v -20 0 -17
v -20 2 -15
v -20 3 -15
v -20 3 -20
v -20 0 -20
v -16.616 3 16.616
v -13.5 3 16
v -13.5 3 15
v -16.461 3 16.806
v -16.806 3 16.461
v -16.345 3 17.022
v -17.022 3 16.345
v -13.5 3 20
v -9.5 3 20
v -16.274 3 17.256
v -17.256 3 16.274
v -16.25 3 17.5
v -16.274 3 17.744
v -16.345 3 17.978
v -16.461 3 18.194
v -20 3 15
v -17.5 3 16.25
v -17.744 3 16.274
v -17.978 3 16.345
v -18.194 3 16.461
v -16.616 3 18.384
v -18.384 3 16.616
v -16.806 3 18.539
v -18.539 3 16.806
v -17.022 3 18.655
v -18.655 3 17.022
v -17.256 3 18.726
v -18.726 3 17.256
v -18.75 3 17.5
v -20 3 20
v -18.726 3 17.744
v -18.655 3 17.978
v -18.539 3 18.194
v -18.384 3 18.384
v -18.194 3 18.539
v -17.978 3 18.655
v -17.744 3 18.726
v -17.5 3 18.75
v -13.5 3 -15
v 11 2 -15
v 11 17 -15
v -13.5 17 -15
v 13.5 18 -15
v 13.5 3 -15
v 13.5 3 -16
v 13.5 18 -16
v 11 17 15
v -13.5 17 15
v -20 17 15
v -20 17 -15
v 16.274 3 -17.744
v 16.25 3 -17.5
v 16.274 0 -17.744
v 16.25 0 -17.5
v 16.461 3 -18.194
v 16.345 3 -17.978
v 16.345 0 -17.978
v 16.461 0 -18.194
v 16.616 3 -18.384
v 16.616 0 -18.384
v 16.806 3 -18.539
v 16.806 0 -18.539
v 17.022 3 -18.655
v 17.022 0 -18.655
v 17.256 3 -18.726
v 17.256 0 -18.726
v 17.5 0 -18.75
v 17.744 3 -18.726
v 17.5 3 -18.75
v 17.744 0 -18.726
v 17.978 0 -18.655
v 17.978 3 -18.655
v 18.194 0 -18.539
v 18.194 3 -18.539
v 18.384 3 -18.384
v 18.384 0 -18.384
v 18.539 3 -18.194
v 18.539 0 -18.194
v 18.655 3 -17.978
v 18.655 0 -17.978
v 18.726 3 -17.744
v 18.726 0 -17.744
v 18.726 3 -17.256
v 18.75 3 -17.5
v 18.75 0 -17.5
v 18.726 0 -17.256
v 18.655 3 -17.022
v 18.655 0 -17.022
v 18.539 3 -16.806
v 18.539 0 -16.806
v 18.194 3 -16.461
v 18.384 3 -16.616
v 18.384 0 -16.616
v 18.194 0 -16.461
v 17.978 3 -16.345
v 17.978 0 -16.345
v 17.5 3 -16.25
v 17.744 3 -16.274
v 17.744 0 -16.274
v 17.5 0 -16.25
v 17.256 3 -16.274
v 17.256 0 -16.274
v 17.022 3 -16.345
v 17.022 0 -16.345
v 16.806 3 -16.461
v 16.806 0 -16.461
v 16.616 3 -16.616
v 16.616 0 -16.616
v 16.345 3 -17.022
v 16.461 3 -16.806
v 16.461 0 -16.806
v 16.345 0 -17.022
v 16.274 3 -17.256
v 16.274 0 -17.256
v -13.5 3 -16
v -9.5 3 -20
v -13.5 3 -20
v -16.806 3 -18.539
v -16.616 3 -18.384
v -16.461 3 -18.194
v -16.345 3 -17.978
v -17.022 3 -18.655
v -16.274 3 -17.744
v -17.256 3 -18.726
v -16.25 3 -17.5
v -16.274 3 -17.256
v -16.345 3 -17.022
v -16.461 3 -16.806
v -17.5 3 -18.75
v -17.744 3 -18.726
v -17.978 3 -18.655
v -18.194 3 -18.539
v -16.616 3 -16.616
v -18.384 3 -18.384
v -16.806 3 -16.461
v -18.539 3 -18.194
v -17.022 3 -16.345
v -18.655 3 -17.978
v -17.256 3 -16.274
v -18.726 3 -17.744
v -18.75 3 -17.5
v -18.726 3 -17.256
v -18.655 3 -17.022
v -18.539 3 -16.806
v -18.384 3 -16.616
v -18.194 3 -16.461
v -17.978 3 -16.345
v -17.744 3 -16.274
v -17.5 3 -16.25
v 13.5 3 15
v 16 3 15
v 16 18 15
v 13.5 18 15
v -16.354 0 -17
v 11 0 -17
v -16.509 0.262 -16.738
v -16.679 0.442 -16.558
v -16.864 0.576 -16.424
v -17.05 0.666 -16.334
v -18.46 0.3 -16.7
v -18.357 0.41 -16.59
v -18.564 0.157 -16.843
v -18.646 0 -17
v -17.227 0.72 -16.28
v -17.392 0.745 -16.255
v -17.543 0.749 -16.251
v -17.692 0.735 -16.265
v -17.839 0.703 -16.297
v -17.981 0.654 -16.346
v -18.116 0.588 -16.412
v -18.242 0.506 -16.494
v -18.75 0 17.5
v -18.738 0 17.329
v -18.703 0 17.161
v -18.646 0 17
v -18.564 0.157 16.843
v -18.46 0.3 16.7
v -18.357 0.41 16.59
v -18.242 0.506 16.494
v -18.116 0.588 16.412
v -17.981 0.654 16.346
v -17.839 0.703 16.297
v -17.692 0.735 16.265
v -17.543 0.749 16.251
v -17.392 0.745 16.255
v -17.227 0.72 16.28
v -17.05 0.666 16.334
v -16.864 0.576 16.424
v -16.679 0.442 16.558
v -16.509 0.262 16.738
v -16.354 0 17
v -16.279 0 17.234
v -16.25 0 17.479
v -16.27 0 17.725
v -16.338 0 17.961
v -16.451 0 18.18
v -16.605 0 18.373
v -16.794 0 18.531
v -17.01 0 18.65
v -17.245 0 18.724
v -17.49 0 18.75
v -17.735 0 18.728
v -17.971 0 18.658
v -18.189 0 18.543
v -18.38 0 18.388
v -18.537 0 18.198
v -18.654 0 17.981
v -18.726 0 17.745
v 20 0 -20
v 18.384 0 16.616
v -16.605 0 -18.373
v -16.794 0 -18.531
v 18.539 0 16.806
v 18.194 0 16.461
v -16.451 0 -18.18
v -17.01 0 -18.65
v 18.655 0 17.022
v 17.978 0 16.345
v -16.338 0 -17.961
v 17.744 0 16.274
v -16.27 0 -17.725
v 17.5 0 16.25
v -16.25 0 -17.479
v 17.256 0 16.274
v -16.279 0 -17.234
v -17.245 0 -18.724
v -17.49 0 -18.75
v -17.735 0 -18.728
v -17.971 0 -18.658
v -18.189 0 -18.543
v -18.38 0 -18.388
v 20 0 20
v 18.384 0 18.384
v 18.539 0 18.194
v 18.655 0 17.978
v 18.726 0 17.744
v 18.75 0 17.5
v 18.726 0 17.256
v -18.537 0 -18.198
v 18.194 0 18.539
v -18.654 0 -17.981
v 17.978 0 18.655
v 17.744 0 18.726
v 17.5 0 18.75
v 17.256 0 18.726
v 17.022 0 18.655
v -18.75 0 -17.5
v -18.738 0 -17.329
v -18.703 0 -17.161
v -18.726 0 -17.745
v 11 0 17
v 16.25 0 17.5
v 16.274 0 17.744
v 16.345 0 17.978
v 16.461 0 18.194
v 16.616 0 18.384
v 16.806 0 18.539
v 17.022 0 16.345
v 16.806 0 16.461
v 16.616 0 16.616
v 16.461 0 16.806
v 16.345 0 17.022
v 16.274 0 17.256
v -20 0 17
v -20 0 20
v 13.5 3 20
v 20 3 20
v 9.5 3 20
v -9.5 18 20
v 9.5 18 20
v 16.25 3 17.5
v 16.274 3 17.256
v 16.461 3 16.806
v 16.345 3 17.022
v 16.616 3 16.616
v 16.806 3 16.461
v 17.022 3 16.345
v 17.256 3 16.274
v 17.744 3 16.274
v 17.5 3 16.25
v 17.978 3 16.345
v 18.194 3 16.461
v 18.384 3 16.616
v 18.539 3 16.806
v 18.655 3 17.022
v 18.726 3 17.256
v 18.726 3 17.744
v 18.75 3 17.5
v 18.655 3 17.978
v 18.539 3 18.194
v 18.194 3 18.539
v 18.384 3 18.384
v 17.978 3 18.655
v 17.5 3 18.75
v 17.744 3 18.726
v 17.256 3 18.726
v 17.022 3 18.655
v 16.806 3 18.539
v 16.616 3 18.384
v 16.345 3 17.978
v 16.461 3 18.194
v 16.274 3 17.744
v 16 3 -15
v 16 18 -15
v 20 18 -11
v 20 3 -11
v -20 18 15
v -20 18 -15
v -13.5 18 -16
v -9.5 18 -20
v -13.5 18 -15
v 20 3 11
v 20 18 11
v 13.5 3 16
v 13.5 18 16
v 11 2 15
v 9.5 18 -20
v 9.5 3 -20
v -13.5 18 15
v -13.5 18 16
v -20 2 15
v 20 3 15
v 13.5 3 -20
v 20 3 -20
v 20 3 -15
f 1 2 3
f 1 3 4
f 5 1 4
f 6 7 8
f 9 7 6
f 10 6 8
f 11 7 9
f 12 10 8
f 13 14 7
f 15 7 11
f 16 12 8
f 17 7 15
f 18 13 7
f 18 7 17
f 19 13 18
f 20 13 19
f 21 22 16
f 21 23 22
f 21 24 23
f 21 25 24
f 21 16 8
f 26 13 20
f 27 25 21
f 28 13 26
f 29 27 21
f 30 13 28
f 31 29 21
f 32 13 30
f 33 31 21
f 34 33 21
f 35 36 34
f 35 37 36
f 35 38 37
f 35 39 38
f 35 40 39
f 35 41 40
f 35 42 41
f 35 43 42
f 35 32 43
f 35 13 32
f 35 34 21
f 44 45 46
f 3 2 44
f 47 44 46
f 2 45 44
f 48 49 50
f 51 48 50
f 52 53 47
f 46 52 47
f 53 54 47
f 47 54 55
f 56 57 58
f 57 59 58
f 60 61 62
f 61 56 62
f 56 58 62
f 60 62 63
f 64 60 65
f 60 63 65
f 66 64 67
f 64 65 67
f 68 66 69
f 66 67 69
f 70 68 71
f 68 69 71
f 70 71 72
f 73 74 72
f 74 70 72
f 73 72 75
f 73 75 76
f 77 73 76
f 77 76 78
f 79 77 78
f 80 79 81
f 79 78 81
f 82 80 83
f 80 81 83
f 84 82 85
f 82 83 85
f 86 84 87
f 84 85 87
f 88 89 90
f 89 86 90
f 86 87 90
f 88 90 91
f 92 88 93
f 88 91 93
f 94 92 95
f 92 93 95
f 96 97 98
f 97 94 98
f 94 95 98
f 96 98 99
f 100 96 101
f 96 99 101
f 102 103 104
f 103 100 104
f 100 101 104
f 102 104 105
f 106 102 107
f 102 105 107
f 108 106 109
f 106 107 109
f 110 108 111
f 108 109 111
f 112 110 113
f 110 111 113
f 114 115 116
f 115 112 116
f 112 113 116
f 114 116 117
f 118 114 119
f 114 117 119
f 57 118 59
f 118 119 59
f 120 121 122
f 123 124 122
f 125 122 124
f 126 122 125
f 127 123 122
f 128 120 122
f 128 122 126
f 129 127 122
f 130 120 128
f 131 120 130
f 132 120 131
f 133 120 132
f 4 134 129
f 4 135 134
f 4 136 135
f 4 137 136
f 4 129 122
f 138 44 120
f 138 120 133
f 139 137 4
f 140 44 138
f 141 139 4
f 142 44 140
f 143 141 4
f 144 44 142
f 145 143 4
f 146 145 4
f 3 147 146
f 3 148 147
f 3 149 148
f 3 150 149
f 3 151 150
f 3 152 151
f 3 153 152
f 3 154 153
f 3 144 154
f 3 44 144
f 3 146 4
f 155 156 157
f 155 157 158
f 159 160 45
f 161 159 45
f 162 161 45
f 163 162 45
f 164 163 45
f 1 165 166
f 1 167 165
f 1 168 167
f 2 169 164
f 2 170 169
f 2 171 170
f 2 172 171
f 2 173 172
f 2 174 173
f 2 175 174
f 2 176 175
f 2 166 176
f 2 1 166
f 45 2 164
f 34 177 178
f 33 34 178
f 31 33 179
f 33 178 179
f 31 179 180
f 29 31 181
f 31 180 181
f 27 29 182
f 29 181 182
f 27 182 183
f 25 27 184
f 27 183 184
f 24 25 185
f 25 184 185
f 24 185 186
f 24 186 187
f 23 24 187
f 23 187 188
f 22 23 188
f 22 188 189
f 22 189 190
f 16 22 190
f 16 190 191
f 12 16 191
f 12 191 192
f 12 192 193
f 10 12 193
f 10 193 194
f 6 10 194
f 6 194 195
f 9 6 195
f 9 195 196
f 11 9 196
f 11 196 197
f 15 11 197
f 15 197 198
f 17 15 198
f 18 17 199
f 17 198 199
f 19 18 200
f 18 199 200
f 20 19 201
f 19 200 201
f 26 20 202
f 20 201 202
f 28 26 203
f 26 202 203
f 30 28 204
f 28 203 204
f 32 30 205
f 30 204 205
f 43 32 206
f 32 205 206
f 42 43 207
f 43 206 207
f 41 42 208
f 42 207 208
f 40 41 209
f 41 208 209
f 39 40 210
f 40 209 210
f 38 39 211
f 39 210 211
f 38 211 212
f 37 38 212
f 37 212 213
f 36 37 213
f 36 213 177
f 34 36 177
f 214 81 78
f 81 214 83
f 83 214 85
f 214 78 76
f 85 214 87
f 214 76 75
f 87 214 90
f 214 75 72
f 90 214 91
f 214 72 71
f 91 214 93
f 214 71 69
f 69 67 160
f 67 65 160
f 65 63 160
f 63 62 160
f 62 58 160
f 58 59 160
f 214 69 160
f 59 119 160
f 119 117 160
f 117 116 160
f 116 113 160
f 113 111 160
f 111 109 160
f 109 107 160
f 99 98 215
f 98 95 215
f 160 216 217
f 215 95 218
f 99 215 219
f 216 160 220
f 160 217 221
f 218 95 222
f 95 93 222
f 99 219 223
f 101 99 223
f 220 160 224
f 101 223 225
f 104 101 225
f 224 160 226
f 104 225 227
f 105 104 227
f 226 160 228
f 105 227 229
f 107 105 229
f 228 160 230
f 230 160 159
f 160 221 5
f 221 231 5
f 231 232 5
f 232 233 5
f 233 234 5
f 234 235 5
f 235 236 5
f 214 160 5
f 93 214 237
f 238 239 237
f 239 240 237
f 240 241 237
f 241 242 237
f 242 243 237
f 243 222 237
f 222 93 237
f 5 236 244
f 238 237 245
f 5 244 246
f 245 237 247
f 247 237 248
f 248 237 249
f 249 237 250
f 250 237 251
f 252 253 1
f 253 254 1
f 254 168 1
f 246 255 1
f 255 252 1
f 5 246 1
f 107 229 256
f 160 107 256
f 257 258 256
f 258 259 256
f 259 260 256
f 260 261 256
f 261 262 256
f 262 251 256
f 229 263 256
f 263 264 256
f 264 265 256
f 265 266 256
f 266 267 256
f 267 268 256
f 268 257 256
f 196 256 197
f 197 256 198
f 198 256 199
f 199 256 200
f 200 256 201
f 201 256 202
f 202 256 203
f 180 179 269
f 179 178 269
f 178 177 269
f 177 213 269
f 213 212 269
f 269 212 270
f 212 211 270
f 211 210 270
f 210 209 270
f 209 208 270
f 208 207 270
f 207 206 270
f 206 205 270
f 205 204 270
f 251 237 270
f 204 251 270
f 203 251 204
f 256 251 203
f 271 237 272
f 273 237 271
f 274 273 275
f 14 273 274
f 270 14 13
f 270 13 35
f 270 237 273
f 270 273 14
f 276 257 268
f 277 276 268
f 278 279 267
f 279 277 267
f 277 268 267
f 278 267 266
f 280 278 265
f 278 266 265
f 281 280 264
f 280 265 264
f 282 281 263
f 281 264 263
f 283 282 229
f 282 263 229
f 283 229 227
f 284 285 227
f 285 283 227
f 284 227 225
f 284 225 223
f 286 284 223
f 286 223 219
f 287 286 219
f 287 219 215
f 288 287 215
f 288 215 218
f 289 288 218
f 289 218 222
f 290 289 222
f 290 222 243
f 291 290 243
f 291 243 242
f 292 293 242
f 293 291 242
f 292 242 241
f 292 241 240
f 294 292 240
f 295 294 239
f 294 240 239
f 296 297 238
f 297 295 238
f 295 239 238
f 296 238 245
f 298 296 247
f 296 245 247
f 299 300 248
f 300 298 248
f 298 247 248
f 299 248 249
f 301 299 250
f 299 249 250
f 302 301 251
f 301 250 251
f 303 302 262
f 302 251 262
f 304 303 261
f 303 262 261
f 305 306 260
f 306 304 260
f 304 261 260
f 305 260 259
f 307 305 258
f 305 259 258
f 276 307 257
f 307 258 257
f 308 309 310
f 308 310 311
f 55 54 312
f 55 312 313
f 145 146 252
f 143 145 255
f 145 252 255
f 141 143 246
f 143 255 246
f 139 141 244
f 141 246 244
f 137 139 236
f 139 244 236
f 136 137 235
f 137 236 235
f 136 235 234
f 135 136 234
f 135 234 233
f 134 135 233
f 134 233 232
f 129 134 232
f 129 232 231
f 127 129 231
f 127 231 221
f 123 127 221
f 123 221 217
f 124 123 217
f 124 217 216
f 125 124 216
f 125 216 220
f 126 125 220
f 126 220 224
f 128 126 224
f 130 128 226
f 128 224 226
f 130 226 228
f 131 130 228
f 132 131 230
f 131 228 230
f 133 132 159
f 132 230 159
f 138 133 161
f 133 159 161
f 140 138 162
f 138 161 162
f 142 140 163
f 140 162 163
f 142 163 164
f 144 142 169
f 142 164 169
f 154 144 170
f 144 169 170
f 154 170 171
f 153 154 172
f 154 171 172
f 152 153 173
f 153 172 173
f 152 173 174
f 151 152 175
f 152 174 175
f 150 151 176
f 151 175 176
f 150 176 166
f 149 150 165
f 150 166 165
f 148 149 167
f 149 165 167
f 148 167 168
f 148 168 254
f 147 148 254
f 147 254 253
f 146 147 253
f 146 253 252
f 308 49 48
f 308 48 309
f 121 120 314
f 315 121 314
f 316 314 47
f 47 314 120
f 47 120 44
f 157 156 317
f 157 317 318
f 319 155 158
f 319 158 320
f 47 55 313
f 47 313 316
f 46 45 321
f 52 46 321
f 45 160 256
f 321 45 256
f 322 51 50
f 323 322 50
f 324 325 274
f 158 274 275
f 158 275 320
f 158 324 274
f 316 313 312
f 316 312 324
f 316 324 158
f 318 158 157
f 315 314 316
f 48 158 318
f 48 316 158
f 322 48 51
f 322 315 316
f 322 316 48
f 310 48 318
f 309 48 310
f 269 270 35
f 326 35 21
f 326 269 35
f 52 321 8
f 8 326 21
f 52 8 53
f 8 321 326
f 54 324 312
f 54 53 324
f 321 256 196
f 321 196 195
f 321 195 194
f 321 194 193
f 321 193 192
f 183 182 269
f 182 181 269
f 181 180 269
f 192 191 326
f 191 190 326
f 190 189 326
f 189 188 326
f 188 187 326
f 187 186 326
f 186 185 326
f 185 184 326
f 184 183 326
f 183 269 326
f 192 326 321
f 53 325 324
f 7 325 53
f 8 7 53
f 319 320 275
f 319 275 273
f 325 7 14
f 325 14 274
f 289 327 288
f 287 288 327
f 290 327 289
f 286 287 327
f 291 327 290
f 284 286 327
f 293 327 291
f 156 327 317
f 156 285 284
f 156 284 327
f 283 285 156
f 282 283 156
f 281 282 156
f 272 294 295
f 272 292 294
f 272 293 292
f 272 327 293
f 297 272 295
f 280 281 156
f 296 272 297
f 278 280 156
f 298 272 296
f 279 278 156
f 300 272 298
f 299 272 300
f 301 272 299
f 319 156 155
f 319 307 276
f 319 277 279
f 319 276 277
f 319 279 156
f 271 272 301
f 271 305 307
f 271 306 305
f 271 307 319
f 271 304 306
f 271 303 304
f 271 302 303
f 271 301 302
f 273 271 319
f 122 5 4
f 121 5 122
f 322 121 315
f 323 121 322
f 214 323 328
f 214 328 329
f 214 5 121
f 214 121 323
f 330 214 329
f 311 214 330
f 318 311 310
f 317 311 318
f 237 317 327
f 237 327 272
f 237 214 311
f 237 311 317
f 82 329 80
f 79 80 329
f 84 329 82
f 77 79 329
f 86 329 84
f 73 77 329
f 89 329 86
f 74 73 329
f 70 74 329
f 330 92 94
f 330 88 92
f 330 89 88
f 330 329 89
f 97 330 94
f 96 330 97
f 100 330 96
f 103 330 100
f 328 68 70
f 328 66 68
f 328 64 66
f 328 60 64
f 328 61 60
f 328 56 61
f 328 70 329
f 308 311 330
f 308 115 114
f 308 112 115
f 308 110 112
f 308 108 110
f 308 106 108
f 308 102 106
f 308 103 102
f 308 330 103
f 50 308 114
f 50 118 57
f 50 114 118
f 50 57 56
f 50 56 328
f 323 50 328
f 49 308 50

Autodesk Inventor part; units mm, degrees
ref_plane "YZ Plane" through (0, 0, 0) normal (1, 0, 0) x (0, 1, 0)
ref_plane "XZ Plane" through (0, 0, 0) normal (0, 1, 0) x (-1, 0, 0)
ref_plane "XY Plane" through (0, 0, 0) normal (0, 0, 1) x (1, 0, 0)
sketch "Sketch1" plane through (0, 0, 0) normal (0, 1, 0) x (-1, 0, 0)
  line L0 (-17.5, 17.5) -> (17.5, -17.5) construction
  line L1 (17.5, 17.5) -> (-17.5, -17.5) construction
  circle A0 centre (17.5, 17.5) radius 1.25
  circle A1 centre (-17.5, 17.5) radius 1.25
  circle A2 centre (17.5, -17.5) radius 1.25
  circle A3 centre (-17.5, -17.5) radius 1.25
  line L2 (-20, 20) -> (20, 20)
  line L3 (20, 20) -> (20, -20)
  line L4 (20, -20) -> (-20, -20)
  line L5 (-20, -20) -> (-20, 20)
  line L6 (-20, 20) -> (20, -20) construction
  line L7 (20, 20) -> (-20, -20) construction
  point P0 (0, 0)
  dimension "d0" = 35
  dimension "d1" = 35
  dimension "d2" = 2.5
  dimension "d3" = 2.5
  dimension "d4" = 2.5
  dimension "d5" = 2.5
  dimension "d6" = 40
  dimension "d7" = 40
extrude "Extrusion2" add sketch "Sketch1" along normal blind 3
sketch "Sketch2" plane through (0, 3, 0) normal (0, 1, 0) x (1, 0, 0)
  line L0 (20, -15) -> (-20, -15)
  line L1 (-20, -15) -> (-20, 15)
  line L2 (-20, 15) -> (20, 15)
  line L3 (20, 15) -> (20, -15)
  line L4 (20, -15) -> (-20, 15) construction
  line L5 (-20, -15) -> (20, 15) construction
  line L6 (-13.5, 10) -> (13.5, 10)
  line L7 (13.5, 10) -> (13.5, 20)
  line L8 (13.5, 20) -> (-13.5, 20)
  line L9 (-13.5, 20) -> (-13.5, 10)
  line L10 (-13.5, 10) -> (13.5, 20) construction
  line L11 (13.5, 10) -> (-13.5, 20) construction
  line L12 (-13.5, -10) -> (13.5, -10)
  line L13 (13.5, -10) -> (13.5, -20)
  line L14 (13.5, -20) -> (-13.5, -20)
  line L15 (-13.5, -20) -> (-13.5, -10)
  line L16 (-13.5, -10) -> (13.5, -20) construction
  line L17 (13.5, -10) -> (-13.5, -20) construction
  point P0 (0, 0)
  point P1 (0, 15)
  point P2 (0, -15)
  point P3 (13.5, -15)
  point P4 (-13.5, -15)
  point P5 (-13.5, 15)
  point P6 (13.5, 15)
  dimension "d12" = 40
  dimension "d13" = 30
  dimension "d27" = 27
  dimension "d28" = 10
  dimension "d29" = 27
  dimension "d30" = 10
extrude "Extrusion3" add sketch "Sketch2" along normal blind 15
sketch "Sketch4" plane through (-20, 0, -20) normal (-1, 0, 0) x (0, 0, 1)
  line L0 (0, 0) -> (40, 0) projected
  line L1 (40, 0) -> (40, 3) projected
  line L2 (35, 3) -> (40, 3) projected
  line L3 (35, 3) -> (35, 18) projected
  line L4 (5, 18) -> (35, 18) projected
  line L5 (5, 3) -> (5, 18) projected
  line L6 (0, 3) -> (5, 3) projected
  line L7 (0, 0) -> (0, 3) projected
  line L8 (33.5, -17) -> (6.5, -17)
  line L9 (6.5, -17) -> (6.5, 17)
  line L10 (6.5, 17) -> (33.5, 17)
  line L11 (33.5, 17) -> (33.5, -17)
  line L12 (33.5, -17) -> (6.5, 17) construction
  line L13 (6.5, -17) -> (33.5, 17) construction
  line L14 (5, 18) -> (6.5, 18)
  line L15 (6.5, 18) -> (6.5, 0)
  line L16 (6.5, 0) -> (5, 0)
  line L17 (5, 0) -> (5, 18)
  line L18 (5, 18) -> (35, 18) projected
  line L19 (35, 18) -> (33.5, 18)
  line L20 (33.5, 18) -> (33.5, 0)
  line L21 (33.5, 0) -> (35, 0)
  line L22 (35, 0) -> (35, 18)
  line L23 (6.5, 17) -> (5, 17)
  line L24 (33.5, 17) -> (35, 17)
  point P0 (20, 0)
  dimension "d20" = 27
  dimension "d21" = 34
extrude "Extrusion5" cut sketch "Sketch4" against normal blind 31 contours L17 L5 L23 L9 L0 | L9 L10 L11 L0 | L11 L24 L3 L22 L0
chamfer "Chamfer2" distance 2 angle 45 2 edges at (-4.5, 0, -15) (-4.5, 0, 15)
chamfer "Chamfer3" distance 4 angle 45 6 edges at (20, 10.5, -15) (13.5, 10.5, -20) (-13.5, 10.5, -20) (-13.5, 10.5, 20) (13.5, 10.5, 20) (20, 10.5, 15)
properties part number "obudowa_gps_bt" material "ABS Plastic"
